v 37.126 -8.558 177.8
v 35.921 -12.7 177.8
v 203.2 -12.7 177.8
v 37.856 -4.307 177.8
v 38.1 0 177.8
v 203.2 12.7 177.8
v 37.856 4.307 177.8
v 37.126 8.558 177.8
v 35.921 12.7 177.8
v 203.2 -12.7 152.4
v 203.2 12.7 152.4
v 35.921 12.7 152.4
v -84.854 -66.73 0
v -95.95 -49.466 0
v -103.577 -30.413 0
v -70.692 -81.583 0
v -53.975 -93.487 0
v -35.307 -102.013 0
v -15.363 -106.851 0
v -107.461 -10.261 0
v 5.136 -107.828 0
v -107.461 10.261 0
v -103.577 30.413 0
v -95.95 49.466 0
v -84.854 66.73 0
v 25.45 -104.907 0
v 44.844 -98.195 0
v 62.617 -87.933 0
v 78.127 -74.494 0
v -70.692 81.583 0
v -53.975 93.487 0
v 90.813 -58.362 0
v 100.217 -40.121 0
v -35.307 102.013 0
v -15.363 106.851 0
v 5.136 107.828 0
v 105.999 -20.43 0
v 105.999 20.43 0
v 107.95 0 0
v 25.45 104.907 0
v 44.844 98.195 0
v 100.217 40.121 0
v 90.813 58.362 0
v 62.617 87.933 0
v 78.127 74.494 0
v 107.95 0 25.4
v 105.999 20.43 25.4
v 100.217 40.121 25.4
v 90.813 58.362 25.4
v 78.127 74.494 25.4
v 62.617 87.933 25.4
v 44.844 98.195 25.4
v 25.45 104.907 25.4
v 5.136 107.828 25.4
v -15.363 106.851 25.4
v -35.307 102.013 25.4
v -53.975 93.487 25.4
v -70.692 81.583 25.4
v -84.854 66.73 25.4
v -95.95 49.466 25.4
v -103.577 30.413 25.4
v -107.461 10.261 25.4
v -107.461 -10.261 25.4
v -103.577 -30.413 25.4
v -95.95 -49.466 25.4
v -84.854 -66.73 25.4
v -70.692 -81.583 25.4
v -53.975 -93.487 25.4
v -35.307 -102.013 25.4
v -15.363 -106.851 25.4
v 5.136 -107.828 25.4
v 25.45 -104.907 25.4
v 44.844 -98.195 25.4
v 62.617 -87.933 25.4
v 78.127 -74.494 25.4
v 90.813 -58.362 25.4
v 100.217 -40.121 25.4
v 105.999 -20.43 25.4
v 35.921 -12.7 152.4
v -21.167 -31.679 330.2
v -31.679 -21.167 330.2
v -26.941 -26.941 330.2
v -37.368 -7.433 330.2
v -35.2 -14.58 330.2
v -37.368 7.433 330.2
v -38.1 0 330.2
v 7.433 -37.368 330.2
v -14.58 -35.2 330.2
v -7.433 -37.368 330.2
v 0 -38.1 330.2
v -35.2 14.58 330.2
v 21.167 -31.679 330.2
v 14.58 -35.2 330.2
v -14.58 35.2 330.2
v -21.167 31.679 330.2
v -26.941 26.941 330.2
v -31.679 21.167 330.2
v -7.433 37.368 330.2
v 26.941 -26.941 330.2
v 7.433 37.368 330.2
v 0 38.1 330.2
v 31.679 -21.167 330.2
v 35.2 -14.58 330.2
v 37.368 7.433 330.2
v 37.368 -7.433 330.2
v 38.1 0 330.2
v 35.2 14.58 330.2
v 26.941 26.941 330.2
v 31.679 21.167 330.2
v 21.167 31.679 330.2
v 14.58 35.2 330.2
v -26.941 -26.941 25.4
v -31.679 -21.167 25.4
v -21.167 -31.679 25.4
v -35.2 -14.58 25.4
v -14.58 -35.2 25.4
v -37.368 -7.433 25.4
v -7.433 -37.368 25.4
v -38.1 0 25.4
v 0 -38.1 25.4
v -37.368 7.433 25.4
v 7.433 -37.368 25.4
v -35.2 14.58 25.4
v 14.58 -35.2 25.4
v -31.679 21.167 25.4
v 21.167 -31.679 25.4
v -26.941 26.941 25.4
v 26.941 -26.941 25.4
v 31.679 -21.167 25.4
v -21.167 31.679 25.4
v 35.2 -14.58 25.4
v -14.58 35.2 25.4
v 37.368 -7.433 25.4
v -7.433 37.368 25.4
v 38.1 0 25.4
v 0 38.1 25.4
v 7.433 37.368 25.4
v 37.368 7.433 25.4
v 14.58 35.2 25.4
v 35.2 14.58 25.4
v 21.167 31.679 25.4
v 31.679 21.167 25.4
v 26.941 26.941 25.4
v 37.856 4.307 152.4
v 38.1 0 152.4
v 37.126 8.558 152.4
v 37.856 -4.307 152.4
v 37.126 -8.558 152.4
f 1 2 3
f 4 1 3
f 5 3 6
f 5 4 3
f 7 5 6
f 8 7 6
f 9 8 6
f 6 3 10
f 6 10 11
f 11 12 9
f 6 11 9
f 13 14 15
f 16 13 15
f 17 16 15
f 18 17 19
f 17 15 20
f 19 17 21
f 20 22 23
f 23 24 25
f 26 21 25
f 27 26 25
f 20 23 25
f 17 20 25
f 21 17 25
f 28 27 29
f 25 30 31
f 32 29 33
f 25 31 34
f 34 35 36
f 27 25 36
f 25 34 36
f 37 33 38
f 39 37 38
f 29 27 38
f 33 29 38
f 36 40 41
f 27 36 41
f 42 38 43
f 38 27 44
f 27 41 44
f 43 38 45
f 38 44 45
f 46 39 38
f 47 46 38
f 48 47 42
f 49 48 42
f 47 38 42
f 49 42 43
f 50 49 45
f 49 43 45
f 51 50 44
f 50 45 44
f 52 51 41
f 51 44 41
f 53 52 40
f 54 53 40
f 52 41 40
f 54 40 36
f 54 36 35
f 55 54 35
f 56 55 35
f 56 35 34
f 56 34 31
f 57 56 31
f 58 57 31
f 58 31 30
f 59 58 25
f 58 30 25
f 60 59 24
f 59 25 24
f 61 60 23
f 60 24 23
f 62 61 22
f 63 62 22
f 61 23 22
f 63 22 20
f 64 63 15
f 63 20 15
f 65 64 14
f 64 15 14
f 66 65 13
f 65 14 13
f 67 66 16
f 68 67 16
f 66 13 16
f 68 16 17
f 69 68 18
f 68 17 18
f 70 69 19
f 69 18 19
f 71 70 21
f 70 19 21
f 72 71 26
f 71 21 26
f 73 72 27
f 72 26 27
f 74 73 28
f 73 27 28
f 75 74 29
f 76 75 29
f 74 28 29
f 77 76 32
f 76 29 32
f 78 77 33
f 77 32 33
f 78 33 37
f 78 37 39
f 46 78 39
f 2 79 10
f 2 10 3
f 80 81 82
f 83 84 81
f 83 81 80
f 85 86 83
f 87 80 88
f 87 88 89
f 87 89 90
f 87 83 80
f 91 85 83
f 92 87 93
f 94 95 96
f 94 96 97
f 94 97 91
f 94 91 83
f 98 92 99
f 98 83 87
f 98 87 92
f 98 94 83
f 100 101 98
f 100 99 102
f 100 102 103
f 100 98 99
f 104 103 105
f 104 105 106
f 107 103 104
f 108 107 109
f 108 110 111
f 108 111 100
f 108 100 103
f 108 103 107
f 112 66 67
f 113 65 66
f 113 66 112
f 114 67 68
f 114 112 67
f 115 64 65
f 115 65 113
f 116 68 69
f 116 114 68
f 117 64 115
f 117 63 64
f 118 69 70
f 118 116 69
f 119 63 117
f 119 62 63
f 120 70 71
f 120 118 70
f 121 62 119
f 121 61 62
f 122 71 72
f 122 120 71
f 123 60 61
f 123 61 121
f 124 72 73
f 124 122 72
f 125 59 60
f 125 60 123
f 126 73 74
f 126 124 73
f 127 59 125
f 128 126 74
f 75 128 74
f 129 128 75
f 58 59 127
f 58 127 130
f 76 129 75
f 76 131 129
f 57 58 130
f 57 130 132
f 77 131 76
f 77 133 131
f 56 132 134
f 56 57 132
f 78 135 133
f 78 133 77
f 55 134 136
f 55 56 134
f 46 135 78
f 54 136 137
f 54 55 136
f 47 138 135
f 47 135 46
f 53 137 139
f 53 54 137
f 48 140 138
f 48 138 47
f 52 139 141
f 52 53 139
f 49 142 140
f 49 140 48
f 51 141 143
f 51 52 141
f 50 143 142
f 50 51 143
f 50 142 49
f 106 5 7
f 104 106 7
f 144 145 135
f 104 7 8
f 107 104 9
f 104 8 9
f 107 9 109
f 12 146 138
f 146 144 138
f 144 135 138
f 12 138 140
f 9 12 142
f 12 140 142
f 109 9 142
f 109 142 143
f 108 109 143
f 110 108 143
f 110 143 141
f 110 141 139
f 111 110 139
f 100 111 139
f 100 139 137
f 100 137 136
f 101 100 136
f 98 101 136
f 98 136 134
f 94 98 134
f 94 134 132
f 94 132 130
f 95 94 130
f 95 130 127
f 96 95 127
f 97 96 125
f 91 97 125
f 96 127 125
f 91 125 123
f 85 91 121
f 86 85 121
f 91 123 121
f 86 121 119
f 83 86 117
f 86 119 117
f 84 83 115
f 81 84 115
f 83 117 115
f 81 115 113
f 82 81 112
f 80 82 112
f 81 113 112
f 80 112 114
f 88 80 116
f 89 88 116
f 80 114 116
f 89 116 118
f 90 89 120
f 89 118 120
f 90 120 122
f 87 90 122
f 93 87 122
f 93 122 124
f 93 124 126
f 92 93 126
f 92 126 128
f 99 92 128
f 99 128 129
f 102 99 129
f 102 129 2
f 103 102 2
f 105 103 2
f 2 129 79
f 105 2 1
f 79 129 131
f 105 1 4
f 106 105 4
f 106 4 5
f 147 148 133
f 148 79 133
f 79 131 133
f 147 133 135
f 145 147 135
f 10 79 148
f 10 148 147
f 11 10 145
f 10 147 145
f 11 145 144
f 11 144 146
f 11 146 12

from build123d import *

# Parameters (mm, degrees)
F0_R     = 107.95
F1_DEPTH = 25.4
F2_R     = 38.1
F3_DEPTH = 304.8
F4_W     = 25.4
F4_H     = 25.4
F5_DEPTH = 203.2


with BuildPart() as f1:
    # F0 (on Top) → F1 (new body)
    with BuildSketch(Plane.XY):
        Circle(F0_R)
    extrude(amount=F1_DEPTH)

    # F2 (on face) → F3 (join)
    with BuildSketch(Plane.XY.offset(25.4)):
        Circle(F2_R)
    extrude(amount=F3_DEPTH)

    # F4 (on Right) → F5 (join)
    with BuildSketch(Plane.YZ):
        with Locations((0, 165.1)):
            Rectangle(F4_W, F4_H)
    extrude(amount=F5_DEPTH)


solid = f1.part
